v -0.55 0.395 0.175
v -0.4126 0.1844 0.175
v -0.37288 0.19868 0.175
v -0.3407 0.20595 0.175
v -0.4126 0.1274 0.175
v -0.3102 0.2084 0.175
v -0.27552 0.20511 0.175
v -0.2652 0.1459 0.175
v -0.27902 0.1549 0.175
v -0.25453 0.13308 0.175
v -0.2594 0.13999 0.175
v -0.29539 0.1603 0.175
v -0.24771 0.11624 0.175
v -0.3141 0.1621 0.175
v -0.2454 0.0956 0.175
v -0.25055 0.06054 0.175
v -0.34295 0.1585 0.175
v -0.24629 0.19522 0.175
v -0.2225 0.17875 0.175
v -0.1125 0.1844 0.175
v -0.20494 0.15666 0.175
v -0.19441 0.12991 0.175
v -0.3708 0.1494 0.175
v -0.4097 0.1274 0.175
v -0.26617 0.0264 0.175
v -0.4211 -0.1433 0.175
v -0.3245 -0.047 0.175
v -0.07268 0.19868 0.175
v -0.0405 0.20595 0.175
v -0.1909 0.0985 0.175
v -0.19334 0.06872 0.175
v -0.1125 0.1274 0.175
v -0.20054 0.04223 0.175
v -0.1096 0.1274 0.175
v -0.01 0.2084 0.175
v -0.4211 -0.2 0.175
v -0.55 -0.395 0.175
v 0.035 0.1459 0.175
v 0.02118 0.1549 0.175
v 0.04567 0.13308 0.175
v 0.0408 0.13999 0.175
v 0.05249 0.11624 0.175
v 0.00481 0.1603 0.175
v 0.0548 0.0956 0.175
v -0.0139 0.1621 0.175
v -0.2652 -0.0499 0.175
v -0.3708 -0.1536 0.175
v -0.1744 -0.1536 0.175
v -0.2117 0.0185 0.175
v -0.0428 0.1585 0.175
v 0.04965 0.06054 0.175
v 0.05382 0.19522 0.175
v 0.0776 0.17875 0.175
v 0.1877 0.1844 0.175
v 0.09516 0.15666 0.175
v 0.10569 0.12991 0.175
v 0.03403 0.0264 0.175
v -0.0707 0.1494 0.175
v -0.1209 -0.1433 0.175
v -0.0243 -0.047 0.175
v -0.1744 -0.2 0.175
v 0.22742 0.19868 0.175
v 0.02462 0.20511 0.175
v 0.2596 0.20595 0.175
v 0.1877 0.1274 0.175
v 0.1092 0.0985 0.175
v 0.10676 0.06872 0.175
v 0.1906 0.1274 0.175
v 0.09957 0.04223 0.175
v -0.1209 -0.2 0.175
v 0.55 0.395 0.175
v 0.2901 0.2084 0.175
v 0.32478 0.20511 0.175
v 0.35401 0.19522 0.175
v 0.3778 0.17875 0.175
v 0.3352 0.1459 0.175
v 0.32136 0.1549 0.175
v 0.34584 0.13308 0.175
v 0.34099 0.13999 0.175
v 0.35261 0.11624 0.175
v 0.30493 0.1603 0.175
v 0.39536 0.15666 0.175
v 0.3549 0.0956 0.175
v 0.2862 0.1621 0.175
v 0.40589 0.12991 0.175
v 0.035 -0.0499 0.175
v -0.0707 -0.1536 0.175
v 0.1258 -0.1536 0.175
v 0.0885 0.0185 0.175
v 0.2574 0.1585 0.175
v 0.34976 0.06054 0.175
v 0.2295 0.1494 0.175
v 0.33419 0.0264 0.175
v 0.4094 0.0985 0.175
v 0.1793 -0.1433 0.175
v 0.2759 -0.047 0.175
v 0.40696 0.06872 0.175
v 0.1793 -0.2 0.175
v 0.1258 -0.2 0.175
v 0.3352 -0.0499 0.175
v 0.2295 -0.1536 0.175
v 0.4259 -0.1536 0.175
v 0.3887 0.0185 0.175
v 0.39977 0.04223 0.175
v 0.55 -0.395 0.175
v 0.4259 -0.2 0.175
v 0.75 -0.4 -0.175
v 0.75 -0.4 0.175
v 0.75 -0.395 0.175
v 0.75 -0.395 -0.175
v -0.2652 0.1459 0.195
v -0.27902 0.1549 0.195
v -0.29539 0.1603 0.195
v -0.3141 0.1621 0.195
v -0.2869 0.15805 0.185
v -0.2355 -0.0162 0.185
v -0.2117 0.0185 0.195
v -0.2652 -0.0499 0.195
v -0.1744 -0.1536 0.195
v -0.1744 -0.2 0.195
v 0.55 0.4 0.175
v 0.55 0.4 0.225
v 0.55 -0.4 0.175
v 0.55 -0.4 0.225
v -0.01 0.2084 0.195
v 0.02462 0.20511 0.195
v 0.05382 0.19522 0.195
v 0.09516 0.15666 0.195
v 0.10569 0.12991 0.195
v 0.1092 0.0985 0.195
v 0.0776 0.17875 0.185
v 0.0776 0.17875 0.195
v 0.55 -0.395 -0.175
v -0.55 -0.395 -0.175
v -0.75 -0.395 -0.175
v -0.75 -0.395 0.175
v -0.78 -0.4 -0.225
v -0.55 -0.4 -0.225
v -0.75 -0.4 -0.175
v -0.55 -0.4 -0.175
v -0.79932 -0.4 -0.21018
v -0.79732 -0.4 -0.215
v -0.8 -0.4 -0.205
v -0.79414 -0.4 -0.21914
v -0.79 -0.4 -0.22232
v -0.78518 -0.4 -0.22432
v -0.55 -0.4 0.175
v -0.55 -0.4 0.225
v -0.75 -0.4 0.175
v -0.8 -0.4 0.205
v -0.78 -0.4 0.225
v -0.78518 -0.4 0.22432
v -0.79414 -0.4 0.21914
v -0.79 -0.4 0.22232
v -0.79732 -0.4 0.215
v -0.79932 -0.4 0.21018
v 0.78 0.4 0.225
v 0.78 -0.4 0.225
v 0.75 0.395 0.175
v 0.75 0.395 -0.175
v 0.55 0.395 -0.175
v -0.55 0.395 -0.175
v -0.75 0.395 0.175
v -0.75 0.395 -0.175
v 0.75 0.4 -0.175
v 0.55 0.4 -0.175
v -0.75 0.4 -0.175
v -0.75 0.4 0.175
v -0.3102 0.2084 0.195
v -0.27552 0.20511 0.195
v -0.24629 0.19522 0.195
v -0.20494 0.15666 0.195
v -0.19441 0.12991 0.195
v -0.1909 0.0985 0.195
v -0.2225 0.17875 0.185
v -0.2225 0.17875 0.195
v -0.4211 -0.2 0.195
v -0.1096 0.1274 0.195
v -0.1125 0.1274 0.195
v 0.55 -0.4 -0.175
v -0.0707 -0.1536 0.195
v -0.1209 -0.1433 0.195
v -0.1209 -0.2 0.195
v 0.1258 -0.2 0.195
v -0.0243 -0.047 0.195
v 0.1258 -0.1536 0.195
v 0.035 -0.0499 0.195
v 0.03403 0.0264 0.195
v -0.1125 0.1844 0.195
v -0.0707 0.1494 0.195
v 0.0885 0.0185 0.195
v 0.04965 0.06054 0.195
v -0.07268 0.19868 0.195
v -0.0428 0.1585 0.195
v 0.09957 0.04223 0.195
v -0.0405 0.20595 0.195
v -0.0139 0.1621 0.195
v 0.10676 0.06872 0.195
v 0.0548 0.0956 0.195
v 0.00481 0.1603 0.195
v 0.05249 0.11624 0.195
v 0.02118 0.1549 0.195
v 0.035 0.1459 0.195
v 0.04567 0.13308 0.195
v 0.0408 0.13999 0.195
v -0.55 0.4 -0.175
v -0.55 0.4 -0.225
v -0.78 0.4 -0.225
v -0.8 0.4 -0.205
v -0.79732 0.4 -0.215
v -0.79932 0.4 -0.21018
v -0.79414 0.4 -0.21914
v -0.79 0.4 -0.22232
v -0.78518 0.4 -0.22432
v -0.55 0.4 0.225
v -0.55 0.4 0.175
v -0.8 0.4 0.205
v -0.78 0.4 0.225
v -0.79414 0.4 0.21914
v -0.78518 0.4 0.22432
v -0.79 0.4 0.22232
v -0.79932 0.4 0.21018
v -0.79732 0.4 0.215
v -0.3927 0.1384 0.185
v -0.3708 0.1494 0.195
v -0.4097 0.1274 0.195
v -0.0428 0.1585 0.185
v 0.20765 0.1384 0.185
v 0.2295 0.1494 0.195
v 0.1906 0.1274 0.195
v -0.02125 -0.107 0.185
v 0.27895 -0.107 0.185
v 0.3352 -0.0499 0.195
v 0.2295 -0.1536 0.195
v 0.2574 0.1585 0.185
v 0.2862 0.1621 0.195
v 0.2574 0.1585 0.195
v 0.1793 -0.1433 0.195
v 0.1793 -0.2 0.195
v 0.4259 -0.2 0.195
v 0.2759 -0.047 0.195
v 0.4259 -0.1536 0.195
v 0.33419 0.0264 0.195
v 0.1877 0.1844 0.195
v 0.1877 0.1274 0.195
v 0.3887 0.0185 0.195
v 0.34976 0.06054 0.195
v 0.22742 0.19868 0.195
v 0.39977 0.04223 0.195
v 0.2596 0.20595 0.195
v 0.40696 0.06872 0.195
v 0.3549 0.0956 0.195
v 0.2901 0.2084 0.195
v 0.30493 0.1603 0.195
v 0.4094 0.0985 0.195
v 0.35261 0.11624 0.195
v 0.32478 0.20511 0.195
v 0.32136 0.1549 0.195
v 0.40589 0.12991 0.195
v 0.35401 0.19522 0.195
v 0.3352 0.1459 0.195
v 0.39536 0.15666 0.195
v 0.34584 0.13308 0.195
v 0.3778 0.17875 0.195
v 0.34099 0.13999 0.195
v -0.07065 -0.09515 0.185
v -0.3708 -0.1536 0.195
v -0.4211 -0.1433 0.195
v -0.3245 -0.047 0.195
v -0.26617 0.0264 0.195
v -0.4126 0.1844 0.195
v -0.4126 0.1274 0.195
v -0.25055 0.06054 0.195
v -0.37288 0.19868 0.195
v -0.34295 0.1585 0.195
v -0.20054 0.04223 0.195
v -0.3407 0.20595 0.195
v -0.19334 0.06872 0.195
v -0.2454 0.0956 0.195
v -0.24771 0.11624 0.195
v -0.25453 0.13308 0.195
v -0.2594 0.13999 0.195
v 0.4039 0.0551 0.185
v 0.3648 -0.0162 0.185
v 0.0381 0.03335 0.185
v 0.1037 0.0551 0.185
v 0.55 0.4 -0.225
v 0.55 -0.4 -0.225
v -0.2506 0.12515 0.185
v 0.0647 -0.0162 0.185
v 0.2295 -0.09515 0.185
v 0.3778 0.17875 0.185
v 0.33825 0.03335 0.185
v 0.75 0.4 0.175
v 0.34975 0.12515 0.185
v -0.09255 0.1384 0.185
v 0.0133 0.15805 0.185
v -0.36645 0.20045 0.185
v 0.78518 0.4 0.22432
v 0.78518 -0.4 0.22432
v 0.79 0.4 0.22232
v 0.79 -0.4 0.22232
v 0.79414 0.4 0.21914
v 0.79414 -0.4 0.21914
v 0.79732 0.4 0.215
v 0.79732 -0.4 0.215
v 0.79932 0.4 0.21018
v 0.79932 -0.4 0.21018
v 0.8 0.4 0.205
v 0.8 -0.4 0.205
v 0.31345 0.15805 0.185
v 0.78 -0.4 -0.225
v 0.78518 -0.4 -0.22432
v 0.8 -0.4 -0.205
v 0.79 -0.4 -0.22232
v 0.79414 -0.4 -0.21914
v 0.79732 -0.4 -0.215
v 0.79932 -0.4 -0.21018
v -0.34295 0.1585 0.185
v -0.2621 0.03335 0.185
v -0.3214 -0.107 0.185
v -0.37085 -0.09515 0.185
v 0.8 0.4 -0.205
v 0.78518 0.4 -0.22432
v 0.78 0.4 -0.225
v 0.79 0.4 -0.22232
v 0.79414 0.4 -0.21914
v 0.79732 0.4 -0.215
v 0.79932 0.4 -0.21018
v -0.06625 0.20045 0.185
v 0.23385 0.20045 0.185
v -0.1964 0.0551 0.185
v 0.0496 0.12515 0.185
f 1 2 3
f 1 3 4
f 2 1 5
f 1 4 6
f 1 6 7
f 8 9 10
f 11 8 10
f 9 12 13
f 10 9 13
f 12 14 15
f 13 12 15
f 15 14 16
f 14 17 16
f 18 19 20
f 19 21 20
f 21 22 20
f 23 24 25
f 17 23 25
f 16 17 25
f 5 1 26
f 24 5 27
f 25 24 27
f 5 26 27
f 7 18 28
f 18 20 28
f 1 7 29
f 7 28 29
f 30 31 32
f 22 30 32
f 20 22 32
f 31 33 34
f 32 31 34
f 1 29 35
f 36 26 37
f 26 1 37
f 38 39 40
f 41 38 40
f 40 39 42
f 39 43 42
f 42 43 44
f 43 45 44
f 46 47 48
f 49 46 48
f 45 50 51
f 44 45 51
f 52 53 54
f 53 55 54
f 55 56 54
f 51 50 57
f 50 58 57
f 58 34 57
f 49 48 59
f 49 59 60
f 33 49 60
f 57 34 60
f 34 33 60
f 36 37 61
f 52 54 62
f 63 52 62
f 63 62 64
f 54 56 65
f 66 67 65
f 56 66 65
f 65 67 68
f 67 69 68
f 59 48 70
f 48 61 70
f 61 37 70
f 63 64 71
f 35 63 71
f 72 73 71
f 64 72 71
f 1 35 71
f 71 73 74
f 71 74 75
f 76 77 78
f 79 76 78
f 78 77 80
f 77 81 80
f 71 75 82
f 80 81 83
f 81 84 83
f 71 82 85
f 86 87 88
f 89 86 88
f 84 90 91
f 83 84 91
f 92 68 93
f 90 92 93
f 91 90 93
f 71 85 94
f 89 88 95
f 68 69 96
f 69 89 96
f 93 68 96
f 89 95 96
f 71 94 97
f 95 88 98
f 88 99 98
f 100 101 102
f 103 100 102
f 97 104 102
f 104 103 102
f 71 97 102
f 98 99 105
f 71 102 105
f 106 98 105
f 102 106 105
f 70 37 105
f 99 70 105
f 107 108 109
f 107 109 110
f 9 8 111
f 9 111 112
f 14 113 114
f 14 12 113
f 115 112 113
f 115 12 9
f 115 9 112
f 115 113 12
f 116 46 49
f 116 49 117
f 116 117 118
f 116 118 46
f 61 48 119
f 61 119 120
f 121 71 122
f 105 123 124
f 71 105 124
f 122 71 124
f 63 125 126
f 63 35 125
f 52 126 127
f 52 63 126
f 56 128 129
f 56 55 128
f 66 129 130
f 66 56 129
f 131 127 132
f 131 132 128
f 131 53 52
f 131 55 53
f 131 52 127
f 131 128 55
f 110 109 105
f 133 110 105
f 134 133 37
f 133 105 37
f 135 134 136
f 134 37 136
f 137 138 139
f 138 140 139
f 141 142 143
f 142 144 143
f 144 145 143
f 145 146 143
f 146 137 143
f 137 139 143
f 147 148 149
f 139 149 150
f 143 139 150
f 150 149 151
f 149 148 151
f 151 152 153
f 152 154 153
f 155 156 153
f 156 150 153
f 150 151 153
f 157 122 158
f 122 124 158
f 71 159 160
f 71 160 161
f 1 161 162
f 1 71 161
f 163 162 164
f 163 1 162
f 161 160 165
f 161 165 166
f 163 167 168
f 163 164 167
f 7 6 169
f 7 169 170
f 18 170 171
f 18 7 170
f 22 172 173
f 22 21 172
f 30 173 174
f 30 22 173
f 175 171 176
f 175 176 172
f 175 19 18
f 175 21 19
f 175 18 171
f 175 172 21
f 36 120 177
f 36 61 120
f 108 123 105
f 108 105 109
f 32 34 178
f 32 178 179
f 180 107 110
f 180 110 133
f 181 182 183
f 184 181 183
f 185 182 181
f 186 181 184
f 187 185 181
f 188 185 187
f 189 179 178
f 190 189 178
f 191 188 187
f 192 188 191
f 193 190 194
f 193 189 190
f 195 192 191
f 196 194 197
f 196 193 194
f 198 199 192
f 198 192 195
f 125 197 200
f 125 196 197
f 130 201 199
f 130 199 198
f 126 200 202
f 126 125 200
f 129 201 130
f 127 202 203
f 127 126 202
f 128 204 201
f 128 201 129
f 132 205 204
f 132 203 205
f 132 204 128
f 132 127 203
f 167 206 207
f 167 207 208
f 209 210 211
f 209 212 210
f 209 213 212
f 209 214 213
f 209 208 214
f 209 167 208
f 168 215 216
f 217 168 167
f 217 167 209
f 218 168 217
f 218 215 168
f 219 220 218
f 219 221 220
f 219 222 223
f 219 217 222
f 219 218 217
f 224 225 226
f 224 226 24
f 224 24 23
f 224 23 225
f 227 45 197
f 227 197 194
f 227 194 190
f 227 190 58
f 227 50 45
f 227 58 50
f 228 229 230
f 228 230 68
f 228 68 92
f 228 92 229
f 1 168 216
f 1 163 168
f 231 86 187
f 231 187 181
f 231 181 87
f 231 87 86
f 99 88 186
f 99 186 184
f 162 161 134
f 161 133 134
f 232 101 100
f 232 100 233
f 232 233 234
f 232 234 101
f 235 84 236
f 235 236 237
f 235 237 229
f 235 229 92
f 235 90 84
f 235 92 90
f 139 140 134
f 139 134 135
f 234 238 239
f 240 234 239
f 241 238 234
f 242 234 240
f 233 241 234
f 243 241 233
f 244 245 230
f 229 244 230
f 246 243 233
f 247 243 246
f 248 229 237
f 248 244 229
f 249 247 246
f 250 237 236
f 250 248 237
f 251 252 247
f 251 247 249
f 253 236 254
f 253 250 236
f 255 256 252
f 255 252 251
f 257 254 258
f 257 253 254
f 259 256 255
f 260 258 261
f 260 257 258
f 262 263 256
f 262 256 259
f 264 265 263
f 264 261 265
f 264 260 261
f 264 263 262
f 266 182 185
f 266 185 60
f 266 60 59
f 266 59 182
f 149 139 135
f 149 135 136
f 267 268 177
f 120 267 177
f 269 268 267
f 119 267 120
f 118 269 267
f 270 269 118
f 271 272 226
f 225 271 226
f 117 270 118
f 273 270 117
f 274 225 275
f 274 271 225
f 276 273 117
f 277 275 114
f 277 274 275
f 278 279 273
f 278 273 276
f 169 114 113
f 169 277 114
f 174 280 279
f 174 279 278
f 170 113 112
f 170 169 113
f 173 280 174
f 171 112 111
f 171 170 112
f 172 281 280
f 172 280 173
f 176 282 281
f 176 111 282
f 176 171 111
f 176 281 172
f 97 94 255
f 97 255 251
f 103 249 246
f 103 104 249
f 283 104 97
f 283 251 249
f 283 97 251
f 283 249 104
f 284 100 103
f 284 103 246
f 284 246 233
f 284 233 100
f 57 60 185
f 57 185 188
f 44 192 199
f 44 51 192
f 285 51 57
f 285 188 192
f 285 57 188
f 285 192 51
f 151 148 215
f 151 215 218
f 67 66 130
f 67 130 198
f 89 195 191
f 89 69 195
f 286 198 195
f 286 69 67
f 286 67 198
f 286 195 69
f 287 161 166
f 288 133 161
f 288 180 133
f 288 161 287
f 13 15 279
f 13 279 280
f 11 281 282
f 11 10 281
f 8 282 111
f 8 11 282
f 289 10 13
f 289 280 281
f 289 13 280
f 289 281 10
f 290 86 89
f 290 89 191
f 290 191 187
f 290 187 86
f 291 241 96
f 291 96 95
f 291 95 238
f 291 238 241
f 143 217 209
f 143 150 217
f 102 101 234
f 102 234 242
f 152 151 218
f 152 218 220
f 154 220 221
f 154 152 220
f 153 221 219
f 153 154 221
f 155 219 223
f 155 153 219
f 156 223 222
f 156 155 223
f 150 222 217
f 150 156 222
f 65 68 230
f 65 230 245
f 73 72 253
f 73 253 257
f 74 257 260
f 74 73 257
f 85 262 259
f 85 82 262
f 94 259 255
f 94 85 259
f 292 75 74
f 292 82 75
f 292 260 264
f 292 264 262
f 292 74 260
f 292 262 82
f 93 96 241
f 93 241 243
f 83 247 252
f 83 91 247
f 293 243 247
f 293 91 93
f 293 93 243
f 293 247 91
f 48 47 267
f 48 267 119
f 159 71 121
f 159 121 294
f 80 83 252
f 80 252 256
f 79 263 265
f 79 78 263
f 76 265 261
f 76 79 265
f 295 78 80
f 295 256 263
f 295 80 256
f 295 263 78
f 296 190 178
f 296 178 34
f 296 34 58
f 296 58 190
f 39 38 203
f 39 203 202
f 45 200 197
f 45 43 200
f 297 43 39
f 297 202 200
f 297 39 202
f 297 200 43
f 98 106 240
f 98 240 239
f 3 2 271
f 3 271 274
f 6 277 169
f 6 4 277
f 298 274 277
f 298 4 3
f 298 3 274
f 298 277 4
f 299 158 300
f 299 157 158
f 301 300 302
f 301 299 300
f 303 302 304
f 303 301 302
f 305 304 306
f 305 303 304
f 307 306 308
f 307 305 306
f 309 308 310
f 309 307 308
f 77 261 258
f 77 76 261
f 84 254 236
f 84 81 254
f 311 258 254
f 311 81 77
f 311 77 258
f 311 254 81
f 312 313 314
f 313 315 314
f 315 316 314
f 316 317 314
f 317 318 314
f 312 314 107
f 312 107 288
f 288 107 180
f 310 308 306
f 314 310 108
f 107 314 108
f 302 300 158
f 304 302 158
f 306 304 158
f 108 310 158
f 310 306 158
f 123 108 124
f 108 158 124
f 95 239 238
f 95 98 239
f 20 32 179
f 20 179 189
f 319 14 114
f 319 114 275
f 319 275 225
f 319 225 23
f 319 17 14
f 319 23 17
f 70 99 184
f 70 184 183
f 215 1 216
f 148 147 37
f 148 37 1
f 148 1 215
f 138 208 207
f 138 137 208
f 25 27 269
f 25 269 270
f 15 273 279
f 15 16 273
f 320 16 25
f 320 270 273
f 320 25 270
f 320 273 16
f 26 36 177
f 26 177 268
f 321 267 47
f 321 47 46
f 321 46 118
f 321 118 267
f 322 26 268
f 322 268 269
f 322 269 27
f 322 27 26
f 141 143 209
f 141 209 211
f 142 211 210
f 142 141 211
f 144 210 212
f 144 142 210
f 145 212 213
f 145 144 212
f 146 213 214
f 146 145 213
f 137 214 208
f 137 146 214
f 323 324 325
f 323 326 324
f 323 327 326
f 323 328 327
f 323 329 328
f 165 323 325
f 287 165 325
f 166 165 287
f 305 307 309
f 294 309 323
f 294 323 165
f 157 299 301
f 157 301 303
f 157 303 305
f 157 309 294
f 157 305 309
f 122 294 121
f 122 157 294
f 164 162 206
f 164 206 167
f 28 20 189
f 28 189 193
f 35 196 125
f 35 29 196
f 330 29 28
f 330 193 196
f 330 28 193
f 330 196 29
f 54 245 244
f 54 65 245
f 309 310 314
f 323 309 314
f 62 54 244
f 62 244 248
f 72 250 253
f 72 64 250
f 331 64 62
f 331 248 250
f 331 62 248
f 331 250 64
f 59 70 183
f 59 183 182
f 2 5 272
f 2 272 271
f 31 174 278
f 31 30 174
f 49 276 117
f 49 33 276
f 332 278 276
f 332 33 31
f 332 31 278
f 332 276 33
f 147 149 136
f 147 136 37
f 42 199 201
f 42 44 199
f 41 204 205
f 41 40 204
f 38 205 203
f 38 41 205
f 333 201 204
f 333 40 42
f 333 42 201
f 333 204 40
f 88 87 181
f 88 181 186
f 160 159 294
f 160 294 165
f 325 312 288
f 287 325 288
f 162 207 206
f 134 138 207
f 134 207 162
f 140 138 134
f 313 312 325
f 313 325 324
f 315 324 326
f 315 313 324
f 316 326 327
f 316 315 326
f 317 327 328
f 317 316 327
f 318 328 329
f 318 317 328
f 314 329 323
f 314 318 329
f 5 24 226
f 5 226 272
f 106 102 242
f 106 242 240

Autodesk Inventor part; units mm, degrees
ref_plane "YZ Plane" through (0, 0, 0) normal (1, 0, 0) x (0, 1, 0)
ref_plane "XZ Plane" through (0, 0, 0) normal (0, 1, 0) x (-1, 0, 0)
ref_plane "XY Plane" through (0, 0, 0) normal (0, 0, 1) x (1, 0, 0)
sketch "Sketch1" plane through (0, 0, 0) normal (0, 1, 0) x (-1, 0, 0)
  line L0 (0.75, 0.175) -> (-0.75, 0.175)
  line L1 (-0.75, 0.175) -> (-0.75, -0.175)
  line L2 (-0.75, -0.175) -> (0.75, -0.175)
  line L3 (0.75, -0.175) -> (0.75, 0.175)
  line L4 (0.55, 0.175) -> (0.55, 0.225)
  line L5 (0.55, 0.225) -> (0.8, 0.225)
  line L6 (0.8, 0.225) -> (0.8, -0.225)
  line L7 (0.8, -0.225) -> (0.55, -0.225)
  line L8 (0.55, -0.225) -> (0.55, -0.175)
  line L9 (-0.55, 0.175) -> (-0.55, 0.225)
  line L10 (-0.55, 0.225) -> (-0.8, 0.225)
  line L11 (-0.8, 0.225) -> (-0.8, -0.225)
  line L12 (-0.8, -0.225) -> (-0.55, -0.225)
  line L13 (-0.55, -0.175) -> (-0.55, -0.225)
  line L14 (0.55, 0.175) -> (-0.55, 0.175)
  point P0 (0, 0)
  point P1 (0, 0.175)
  point P2 (0.75, 0)
  dimension "d0" = 1.6
  dimension "d1" = 0.05
  dimension "d2" = 0.05
  dimension "d3" = 0.45
  dimension "d4" = 0.25
extrude "Extrusion1" add sketch "Sketch1" along normal mid plane 0.8 contours L0 L4 L5 L6 L7 L8 L2 L3 | L0 L1 L2 L13 L12 L11 L10 L9
extrude "Extrusion2" add sketch "Sketch1" along normal mid plane 0.79 contours L3 L2 L1 L0
sketch "Sketch2" plane through (-0.55, -0.395, 0.175) normal (0, 0, 1) x (1, 0, 0)
  line L0 (0, 0) -> (0, 0.79) projected
  line L1 (1.1, 0) -> (0, 0) projected
  line L2 (1.1, 0) -> (1.1, 0.79) projected
  line L3 (0, 0.79) -> (1.1, 0.79) projected
  line L4 (0, 0.395) -> (1.1, 0.395) construction
  line L5 (0.3756, 0.195) -> (0.1289, 0.195)
  line L6 (0.1289, 0.195) -> (0.1289, 0.2517)
  spline S0 degree 2 poles (0.1289, 0.2517) (0.1555, 0.2767) (0.2028, 0.323) (0.2255, 0.348) knots 0 0 0 1 2 2 2
  spline S1 degree 2 poles (0.2255, 0.348) (0.2712, 0.3982) (0.3046, 0.4585) (0.3046, 0.4906) knots 0 0 0 1 2 2 2
  spline S2 degree 2 poles (0.3046, 0.4906) (0.3046, 0.5075) (0.2942, 0.5328) (0.2848, 0.5409) knots 0 0 0 1 2 2 2
  spline S3 degree 2 poles (0.2848, 0.5409) (0.2754, 0.549) (0.2508, 0.5571) (0.2359, 0.5571) knots 0 0 0 1 2 2 2
  spline S4 degree 2 poles (0.2359, 0.5571) (0.2216, 0.5571) (0.1925, 0.5499) (0.1792, 0.5444) knots 0 0 0 1 2 2 2
  spline S5 degree 2 poles (0.1792, 0.5444) (0.1678, 0.5399) (0.1468, 0.5269) (0.1403, 0.5224) knots 0 0 0 1 2 2 2
  line L7 (0.1403, 0.5224) -> (0.1374, 0.5224)
  line L8 (0.1374, 0.5224) -> (0.1374, 0.5794)
  spline S6 degree 2 poles (0.1374, 0.5794) (0.1539, 0.5875) (0.2132, 0.6034) (0.2398, 0.6034) knots 0 0 0 1 2 2 2
  spline S7 degree 2 poles (0.2398, 0.6034) (0.2959, 0.6034) (0.3591, 0.5441) (0.3591, 0.4935) knots 0 0 0 1 2 2 2
  spline S8 degree 2 poles (0.3591, 0.4935) (0.3591, 0.4699) (0.3481, 0.4303) (0.3383, 0.4135) knots 0 0 0 1 2 2 2
  spline S9 degree 2 poles (0.3383, 0.4135) (0.3286, 0.396) (0.3004, 0.3616) (0.2848, 0.3451) knots 0 0 0 1 2 2 2
  spline S10 degree 2 poles (0.2848, 0.3451) (0.2596, 0.3175) (0.1976, 0.2585) (0.1792, 0.2414) knots 0 0 0 1 2 2 2
  line L9 (0.1792, 0.2414) -> (0.3756, 0.2414)
  line L10 (0.3756, 0.2414) -> (0.3756, 0.195)
  line L11 (0.6758, 0.195) -> (0.4291, 0.195)
  line L12 (0.4291, 0.195) -> (0.4291, 0.2517)
  spline S11 degree 2 poles (0.4291, 0.2517) (0.4557, 0.2767) (0.503, 0.323) (0.5257, 0.348) knots 0 0 0 1 2 2 2
  spline S12 degree 2 poles (0.5257, 0.348) (0.5714, 0.3982) (0.6048, 0.4585) (0.6048, 0.4906) knots 0 0 0 1 2 2 2
  spline S13 degree 2 poles (0.6048, 0.4906) (0.6048, 0.5075) (0.5944, 0.5328) (0.585, 0.5409) knots 0 0 0 1 2 2 2
  spline S14 degree 2 poles (0.585, 0.5409) (0.5756, 0.549) (0.551, 0.5571) (0.5361, 0.5571) knots 0 0 0 1 2 2 2
  spline S15 degree 2 poles (0.5361, 0.5571) (0.5218, 0.5571) (0.4926, 0.5499) (0.4793, 0.5444) knots 0 0 0 1 2 2 2
  spline S16 degree 2 poles (0.4793, 0.5444) (0.468, 0.5399) (0.4469, 0.5269) (0.4404, 0.5224) knots 0 0 0 1 2 2 2
  line L13 (0.4404, 0.5224) -> (0.4375, 0.5224)
  line L14 (0.4375, 0.5224) -> (0.4375, 0.5794)
  spline S17 degree 2 poles (0.4375, 0.5794) (0.4541, 0.5875) (0.5134, 0.6034) (0.54, 0.6034) knots 0 0 0 1 2 2 2
  spline S18 degree 2 poles (0.54, 0.6034) (0.596, 0.6034) (0.6592, 0.5441) (0.6592, 0.4935) knots 0 0 0 1 2 2 2
  spline S19 degree 2 poles (0.6592, 0.4935) (0.6592, 0.4699) (0.6482, 0.4303) (0.6385, 0.4135) knots 0 0 0 1 2 2 2
  spline S20 degree 2 poles (0.6385, 0.4135) (0.6288, 0.396) (0.6006, 0.3616) (0.585, 0.3451) knots 0 0 0 1 2 2 2
  spline S21 degree 2 poles (0.585, 0.3451) (0.5597, 0.3175) (0.4978, 0.2585) (0.4793, 0.2414) knots 0 0 0 1 2 2 2
  line L15 (0.4793, 0.2414) -> (0.6758, 0.2414)
  line L16 (0.6758, 0.2414) -> (0.6758, 0.195)
  line L17 (0.9759, 0.195) -> (0.7293, 0.195)
  line L18 (0.7293, 0.195) -> (0.7293, 0.2517)
  spline S22 degree 2 poles (0.7293, 0.2517) (0.7558, 0.2767) (0.8032, 0.323) (0.8259, 0.348) knots 0 0 0 1 2 2 2
  spline S23 degree 2 poles (0.8259, 0.348) (0.8716, 0.3982) (0.9049, 0.4585) (0.9049, 0.4906) knots 0 0 0 1 2 2 2
  spline S24 degree 2 poles (0.9049, 0.4906) (0.9049, 0.5075) (0.8946, 0.5328) (0.8852, 0.5409) knots 0 0 0 1 2 2 2
  spline S25 degree 2 poles (0.8852, 0.5409) (0.8758, 0.549) (0.8511, 0.5571) (0.8362, 0.5571) knots 0 0 0 1 2 2 2
  spline S26 degree 2 poles (0.8362, 0.5571) (0.822, 0.5571) (0.7928, 0.5499) (0.7795, 0.5444) knots 0 0 0 1 2 2 2
  spline S27 degree 2 poles (0.7795, 0.5444) (0.7682, 0.5399) (0.7471, 0.5269) (0.7406, 0.5224) knots 0 0 0 1 2 2 2
  line L19 (0.7406, 0.5224) -> (0.7377, 0.5224)
  line L20 (0.7377, 0.5224) -> (0.7377, 0.5794)
  spline S28 degree 2 poles (0.7377, 0.5794) (0.7542, 0.5875) (0.8135, 0.6034) (0.8401, 0.6034) knots 0 0 0 1 2 2 2
  spline S29 degree 2 poles (0.8401, 0.6034) (0.8962, 0.6034) (0.9594, 0.5441) (0.9594, 0.4935) knots 0 0 0 1 2 2 2
  spline S30 degree 2 poles (0.9594, 0.4935) (0.9594, 0.4699) (0.9484, 0.4303) (0.9387, 0.4135) knots 0 0 0 1 2 2 2
  spline S31 degree 2 poles (0.9387, 0.4135) (0.9289, 0.396) (0.9007, 0.3616) (0.8852, 0.3451) knots 0 0 0 1 2 2 2
  spline S32 degree 2 poles (0.8852, 0.3451) (0.8599, 0.3175) (0.798, 0.2585) (0.7795, 0.2414) knots 0 0 0 1 2 2 2
  line L21 (0.7795, 0.2414) -> (0.9759, 0.2414)
  line L22 (0.9759, 0.2414) -> (0.9759, 0.195)
  point P0 (0.55, 0.395)
extrude "Extrusion3" add sketch "Sketch2" along normal blind 0.02 contours L5 L6 S0 S1 S2 S3 S4 S5 L7 L8 S6 S7 S8 S9 S10 L9 L10 | L11 L12 S11 S12 S13 S14 S15 S16 L13 L14 S17 S18 S19 S20 S21 L15 L16 | L17 L18 S22 S23 S24 S25 S26 S27 L19 L20 S28 S29 S30 S31 S32 L21 L22
fillet "Fillet1" radius 0.02 4 edges at (-0.8, 0, 0.225) (-0.8, 0, -0.225) (0.8, 0, 0.225) (0.8, 0, -0.225)
equation "\"d2\" = d1"
properties part number "21-1001" material "Copper"
